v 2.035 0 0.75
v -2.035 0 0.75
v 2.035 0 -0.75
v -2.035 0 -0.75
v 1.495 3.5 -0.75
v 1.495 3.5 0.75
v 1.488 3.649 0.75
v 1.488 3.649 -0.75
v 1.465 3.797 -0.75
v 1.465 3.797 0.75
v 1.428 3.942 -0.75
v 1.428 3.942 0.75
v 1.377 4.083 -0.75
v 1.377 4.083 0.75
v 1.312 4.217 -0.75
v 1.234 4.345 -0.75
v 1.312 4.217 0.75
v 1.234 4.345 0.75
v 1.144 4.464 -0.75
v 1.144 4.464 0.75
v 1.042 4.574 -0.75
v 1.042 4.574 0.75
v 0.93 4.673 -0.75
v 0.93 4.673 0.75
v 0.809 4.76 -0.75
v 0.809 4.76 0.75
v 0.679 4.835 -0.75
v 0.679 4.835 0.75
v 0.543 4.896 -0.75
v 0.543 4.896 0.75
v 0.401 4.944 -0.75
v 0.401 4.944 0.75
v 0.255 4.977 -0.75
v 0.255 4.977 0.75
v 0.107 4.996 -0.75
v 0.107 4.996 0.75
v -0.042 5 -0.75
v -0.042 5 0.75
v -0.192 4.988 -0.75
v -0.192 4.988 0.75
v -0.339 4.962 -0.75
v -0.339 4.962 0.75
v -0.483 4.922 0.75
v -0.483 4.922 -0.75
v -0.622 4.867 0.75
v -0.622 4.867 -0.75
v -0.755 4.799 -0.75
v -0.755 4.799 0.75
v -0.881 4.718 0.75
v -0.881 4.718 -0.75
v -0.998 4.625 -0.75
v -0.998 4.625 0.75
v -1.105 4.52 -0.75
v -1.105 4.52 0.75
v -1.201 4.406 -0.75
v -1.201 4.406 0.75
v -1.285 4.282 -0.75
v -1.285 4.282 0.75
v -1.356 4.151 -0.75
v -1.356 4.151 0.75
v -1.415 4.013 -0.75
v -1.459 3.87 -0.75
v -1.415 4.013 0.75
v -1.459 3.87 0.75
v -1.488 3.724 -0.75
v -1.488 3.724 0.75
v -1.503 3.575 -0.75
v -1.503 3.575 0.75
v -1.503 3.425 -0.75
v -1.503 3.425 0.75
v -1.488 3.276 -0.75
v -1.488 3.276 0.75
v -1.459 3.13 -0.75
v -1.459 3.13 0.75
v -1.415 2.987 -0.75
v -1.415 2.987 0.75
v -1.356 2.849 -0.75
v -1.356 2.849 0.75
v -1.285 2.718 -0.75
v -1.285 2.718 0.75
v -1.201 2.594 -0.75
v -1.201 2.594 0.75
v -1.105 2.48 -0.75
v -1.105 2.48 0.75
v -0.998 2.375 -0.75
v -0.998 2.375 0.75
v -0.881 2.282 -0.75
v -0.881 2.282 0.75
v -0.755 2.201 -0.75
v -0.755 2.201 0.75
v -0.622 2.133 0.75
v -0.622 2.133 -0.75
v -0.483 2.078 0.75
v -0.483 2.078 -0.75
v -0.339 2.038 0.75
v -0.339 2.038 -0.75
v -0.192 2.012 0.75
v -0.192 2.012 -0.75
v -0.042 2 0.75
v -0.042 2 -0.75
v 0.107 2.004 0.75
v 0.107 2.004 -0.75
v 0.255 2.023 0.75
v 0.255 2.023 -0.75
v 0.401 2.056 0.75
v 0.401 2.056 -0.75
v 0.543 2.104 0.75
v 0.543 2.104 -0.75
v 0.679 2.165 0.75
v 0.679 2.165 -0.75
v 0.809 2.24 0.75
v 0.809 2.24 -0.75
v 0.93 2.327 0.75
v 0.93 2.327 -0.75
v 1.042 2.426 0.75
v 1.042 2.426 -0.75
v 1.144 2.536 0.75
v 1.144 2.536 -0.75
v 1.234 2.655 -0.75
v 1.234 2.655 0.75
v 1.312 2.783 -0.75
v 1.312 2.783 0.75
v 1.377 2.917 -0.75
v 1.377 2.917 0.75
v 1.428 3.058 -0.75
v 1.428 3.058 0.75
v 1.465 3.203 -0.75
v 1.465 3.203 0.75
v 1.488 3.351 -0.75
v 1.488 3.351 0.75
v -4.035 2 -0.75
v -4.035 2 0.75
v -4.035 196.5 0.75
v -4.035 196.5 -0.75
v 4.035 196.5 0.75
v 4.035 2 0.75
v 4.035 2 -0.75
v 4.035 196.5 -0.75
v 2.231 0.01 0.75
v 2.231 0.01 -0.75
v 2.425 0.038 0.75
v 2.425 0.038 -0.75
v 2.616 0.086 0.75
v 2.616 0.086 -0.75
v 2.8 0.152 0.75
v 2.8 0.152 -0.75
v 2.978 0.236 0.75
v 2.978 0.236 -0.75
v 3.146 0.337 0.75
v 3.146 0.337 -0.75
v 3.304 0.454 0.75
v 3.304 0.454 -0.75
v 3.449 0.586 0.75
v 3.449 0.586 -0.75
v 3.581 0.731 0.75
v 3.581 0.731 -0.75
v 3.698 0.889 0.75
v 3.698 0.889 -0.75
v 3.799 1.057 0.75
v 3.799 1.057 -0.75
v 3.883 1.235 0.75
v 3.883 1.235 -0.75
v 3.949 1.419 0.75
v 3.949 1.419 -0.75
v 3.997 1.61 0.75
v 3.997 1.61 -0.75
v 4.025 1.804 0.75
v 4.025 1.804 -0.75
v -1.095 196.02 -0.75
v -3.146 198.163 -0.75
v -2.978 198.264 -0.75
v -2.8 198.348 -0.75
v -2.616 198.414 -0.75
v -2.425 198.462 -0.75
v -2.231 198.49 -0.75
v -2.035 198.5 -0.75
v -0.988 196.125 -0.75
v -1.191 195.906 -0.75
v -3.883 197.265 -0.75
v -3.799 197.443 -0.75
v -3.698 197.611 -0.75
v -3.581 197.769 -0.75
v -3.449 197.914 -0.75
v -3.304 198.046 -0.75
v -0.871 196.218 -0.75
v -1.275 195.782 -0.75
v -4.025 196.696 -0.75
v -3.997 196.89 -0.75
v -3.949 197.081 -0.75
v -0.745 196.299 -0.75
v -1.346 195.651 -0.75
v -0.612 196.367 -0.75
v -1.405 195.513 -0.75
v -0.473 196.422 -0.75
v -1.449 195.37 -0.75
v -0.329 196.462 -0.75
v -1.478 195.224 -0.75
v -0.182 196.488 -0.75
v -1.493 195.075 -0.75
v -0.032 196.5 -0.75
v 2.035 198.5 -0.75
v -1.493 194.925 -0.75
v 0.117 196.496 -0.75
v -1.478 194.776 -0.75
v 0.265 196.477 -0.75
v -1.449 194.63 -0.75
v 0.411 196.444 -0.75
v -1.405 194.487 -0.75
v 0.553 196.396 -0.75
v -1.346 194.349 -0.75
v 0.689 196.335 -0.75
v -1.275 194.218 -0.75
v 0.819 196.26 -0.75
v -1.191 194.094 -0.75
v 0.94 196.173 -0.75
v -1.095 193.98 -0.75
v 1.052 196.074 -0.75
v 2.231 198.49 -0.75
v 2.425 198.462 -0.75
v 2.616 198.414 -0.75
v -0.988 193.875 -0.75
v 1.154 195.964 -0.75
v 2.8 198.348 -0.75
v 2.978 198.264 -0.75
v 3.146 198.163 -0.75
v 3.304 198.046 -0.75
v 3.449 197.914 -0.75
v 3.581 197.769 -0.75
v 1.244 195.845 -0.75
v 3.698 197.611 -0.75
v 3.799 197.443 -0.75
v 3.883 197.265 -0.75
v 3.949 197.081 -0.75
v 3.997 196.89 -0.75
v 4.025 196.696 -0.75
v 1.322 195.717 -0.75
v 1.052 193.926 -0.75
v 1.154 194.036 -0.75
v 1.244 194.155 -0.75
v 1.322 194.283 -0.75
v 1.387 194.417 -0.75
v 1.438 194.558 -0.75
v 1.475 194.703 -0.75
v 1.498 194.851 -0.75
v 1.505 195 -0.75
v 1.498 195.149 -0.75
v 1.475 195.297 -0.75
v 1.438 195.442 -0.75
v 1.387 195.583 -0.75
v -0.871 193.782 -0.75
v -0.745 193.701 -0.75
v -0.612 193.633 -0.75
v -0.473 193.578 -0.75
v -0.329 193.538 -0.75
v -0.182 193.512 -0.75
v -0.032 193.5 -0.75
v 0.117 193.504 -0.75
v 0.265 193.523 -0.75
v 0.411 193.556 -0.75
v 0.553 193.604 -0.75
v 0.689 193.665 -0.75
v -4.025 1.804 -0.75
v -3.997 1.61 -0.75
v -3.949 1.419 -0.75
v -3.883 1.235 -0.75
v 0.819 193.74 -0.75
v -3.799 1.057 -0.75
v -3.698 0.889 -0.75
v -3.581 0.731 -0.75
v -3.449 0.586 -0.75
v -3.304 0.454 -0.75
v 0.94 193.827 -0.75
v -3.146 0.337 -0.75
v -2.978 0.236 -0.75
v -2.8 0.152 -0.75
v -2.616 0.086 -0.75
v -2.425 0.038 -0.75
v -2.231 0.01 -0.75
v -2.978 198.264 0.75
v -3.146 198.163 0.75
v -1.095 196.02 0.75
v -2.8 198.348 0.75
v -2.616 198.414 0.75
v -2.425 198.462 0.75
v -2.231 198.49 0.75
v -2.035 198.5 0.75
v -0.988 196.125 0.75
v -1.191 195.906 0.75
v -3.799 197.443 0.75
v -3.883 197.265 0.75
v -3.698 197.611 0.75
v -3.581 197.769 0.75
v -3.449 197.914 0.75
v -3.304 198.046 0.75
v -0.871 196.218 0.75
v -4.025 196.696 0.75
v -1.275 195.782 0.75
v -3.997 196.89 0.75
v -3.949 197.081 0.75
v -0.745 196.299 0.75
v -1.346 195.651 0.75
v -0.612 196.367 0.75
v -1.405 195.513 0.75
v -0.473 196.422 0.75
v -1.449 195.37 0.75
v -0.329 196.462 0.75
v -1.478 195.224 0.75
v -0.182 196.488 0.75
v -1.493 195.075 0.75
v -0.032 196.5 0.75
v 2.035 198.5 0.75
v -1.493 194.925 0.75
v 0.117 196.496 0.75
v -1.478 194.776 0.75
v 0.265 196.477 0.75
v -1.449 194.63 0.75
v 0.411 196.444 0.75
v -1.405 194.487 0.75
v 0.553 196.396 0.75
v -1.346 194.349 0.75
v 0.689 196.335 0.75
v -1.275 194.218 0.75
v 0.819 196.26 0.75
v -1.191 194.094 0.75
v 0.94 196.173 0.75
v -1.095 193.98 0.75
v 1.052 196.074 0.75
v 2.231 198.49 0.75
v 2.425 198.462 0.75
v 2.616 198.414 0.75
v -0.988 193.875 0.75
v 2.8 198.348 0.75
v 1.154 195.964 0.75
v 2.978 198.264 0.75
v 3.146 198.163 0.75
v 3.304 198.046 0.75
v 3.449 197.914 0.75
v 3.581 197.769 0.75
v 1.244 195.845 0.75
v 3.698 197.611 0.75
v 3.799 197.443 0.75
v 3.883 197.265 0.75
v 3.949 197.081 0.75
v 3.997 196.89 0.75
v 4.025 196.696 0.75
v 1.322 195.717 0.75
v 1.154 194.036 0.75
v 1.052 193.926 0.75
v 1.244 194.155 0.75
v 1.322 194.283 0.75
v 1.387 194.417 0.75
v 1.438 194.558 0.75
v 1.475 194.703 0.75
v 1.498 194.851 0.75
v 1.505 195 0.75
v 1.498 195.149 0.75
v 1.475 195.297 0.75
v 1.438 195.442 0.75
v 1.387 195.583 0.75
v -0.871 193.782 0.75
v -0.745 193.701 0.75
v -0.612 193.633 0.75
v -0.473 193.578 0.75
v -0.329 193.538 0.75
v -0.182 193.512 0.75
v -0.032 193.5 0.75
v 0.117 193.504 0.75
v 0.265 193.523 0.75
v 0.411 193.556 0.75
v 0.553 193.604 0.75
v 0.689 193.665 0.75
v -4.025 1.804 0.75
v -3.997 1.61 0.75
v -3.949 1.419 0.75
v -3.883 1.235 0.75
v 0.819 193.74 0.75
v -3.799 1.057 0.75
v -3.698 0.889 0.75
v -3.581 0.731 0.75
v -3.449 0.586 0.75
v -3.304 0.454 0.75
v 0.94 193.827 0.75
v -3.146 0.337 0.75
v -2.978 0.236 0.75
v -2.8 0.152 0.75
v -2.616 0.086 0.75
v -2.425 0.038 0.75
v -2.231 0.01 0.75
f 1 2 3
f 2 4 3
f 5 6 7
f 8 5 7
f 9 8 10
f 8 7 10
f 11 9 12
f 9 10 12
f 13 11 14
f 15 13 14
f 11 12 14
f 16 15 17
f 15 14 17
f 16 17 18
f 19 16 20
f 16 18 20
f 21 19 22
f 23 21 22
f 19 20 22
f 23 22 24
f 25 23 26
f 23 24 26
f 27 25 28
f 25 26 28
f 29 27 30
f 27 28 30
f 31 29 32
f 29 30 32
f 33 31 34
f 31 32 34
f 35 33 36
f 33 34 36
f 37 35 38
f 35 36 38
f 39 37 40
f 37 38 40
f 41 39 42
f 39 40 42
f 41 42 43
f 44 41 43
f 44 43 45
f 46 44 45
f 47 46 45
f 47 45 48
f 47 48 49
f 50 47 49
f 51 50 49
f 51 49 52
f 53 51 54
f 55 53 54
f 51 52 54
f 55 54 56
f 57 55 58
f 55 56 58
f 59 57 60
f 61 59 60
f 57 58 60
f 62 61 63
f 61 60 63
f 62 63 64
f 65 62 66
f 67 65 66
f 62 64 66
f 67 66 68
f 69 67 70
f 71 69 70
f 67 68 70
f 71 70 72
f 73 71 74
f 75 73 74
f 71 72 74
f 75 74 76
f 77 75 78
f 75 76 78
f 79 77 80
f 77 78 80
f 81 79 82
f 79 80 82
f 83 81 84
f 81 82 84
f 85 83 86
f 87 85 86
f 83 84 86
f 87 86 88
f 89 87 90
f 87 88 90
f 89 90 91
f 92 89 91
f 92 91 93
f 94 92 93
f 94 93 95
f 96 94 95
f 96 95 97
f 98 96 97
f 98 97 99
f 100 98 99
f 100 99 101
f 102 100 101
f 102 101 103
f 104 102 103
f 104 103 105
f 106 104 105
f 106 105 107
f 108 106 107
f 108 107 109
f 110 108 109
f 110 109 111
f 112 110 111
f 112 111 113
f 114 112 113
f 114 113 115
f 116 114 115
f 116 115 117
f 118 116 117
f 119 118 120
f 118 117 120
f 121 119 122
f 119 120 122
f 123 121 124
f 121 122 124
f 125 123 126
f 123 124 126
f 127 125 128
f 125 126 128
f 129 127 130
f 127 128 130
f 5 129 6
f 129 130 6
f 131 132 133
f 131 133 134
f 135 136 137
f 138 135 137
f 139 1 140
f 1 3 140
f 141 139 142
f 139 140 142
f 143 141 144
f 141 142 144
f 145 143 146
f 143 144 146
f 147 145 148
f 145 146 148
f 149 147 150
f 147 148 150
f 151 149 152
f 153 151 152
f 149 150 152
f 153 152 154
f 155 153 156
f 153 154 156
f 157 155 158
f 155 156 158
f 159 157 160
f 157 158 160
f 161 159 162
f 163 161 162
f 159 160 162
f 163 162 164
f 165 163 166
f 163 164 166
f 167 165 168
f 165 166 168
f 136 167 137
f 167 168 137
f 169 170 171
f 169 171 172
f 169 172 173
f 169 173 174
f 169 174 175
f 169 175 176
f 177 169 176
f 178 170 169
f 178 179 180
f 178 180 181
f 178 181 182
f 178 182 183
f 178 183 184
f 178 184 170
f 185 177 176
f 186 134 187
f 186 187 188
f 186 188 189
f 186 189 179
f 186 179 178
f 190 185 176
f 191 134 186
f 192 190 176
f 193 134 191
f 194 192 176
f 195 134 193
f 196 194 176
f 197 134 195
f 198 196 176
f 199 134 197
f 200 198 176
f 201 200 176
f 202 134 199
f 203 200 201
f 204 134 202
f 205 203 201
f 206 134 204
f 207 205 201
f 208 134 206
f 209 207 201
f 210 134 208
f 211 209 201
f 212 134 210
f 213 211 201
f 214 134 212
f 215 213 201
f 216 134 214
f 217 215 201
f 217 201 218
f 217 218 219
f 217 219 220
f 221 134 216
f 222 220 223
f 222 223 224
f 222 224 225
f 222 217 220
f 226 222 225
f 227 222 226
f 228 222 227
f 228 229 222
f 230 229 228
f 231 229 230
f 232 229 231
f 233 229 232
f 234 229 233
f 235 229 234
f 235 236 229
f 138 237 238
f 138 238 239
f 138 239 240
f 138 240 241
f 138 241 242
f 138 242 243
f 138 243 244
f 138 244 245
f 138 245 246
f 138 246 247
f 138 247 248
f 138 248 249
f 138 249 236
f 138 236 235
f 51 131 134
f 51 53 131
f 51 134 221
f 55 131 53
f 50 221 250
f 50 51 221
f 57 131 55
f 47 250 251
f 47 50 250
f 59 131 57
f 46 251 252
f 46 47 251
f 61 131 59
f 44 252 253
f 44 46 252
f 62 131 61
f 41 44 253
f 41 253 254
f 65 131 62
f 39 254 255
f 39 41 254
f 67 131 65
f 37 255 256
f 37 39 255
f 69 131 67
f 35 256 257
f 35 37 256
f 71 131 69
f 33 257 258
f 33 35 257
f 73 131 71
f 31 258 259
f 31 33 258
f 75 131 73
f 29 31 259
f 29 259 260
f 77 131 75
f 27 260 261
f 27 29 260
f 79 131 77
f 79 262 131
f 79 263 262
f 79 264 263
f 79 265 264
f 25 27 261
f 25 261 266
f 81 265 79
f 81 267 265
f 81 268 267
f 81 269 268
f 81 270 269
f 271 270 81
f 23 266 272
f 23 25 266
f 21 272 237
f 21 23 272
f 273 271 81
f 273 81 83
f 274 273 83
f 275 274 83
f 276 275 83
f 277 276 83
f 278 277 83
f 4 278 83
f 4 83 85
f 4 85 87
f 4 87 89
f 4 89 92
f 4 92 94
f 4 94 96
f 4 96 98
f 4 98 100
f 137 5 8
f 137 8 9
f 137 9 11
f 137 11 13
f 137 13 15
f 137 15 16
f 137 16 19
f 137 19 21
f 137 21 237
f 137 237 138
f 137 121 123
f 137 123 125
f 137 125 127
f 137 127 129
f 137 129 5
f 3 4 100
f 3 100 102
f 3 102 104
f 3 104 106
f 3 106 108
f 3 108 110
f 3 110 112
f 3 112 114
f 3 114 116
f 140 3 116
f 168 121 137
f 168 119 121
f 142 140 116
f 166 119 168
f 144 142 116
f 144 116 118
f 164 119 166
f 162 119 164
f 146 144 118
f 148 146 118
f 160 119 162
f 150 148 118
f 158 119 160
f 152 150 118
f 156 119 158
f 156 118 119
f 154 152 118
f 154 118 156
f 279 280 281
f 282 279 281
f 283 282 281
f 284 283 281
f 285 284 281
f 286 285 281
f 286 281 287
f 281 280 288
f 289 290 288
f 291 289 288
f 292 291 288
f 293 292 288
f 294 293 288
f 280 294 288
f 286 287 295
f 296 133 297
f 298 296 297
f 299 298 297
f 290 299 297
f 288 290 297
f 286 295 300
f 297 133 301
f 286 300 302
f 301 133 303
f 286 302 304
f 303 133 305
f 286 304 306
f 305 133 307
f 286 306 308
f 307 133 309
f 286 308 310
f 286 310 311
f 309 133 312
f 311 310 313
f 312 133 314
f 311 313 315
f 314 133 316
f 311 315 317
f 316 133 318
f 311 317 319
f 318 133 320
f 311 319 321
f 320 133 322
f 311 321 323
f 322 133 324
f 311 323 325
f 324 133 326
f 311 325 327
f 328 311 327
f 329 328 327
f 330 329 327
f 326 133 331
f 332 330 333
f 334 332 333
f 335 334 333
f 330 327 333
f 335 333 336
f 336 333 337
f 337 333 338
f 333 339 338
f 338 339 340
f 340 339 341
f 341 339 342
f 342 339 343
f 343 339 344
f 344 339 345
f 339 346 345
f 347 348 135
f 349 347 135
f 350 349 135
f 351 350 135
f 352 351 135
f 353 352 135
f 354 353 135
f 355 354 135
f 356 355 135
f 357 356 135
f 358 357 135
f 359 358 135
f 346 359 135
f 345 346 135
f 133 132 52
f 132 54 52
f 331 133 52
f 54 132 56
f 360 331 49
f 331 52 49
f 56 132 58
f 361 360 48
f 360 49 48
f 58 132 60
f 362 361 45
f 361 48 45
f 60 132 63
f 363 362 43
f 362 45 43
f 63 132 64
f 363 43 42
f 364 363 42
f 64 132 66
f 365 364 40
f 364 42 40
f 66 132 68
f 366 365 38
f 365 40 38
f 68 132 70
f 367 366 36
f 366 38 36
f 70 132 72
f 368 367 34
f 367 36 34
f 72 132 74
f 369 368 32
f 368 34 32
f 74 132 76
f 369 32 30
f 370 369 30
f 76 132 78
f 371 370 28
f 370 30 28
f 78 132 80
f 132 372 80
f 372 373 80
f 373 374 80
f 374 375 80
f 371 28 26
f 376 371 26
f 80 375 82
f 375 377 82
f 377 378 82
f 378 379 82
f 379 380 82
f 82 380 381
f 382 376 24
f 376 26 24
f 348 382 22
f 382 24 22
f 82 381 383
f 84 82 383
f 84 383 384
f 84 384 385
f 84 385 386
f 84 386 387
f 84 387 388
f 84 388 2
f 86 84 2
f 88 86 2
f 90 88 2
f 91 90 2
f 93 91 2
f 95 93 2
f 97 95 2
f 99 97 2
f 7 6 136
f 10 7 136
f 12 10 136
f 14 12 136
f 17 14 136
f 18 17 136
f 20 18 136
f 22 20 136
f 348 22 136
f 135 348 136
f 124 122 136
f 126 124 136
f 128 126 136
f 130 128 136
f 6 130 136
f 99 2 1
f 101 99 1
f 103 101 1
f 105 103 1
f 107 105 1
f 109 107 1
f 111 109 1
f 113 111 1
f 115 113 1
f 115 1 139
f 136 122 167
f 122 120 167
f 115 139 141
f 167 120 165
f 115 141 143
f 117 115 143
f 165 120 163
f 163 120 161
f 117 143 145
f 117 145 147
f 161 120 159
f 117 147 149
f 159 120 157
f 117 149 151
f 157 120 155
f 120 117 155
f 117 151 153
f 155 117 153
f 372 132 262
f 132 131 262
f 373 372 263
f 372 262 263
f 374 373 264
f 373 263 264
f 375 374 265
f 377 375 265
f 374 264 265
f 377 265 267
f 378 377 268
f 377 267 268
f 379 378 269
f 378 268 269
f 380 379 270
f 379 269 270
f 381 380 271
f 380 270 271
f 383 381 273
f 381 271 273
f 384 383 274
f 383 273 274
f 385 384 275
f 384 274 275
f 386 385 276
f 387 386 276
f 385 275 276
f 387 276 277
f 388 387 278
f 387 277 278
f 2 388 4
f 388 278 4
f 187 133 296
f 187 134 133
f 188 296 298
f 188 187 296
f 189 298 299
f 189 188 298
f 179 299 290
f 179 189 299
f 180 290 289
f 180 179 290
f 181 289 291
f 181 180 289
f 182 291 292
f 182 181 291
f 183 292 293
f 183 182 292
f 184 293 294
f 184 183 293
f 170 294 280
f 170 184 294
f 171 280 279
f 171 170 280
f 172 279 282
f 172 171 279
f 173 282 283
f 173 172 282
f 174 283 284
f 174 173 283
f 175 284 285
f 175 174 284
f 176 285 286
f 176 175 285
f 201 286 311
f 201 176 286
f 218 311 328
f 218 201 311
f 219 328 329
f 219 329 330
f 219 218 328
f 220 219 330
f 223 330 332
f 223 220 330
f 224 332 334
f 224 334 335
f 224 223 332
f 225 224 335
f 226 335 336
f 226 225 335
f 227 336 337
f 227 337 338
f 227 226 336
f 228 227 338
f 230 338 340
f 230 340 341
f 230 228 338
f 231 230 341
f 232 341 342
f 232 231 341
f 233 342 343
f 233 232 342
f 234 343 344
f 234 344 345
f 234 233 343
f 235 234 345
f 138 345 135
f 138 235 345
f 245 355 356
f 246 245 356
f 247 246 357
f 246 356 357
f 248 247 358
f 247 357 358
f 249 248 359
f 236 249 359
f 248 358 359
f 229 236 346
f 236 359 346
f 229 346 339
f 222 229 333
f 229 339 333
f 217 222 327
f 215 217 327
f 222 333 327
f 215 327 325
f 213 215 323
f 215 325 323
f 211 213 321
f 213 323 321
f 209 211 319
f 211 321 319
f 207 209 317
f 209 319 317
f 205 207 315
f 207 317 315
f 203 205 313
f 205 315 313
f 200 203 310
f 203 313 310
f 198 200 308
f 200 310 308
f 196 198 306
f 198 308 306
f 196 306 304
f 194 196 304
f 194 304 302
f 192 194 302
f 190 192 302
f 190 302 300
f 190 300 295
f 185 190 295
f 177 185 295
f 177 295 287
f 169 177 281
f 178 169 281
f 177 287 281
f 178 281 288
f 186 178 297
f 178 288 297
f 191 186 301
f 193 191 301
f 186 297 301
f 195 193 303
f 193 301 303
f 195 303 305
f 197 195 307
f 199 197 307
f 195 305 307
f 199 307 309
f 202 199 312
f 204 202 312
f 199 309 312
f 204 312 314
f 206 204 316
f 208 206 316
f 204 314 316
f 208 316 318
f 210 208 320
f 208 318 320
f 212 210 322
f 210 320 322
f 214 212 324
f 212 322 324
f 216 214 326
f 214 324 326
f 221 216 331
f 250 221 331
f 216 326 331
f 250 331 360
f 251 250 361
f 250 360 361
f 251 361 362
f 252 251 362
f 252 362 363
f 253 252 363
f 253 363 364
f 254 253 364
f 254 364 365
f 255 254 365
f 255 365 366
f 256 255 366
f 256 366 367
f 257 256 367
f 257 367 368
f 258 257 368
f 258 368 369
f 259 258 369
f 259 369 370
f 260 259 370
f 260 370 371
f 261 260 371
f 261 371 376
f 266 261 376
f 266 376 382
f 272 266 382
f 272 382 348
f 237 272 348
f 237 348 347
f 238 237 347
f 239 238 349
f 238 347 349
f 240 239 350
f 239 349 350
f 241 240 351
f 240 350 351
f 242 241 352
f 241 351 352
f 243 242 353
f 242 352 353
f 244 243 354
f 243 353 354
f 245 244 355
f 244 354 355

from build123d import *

# Parameters (mm, degrees)
SKETCH1_W           = 8.07
SKETCH1_H           = 1.5
BOSS_EXTRUDE1_DEPTH = 198.5
SKETCH2_R           = 1.5
CUT_EXTRUDE1_DEPTH  = 1.5
FILLET1_R           = 2


with BuildPart() as part:
    # Sketch1 → Boss-Extrude1 (new body)
    with BuildSketch(Plane(origin=(0, 0, 0), x_dir=(1, 0, 0), z_dir=(0, 1, 0))):
        Rectangle(SKETCH1_W, SKETCH1_H)
    extrude(amount=BOSS_EXTRUDE1_DEPTH)

    # Sketch2 → Cut-Extrude1 (cut)
    with BuildSketch(Plane.XY.offset(0.75)):
        with Locations((-0.005, 3.499996429)):
            Circle(SKETCH2_R)
        with Locations((0.005, 195)):
            Circle(SKETCH2_R)
    extrude(amount=-CUT_EXTRUDE1_DEPTH, mode=Mode.SUBTRACT)

    # Fillet1
    fillet1_edges = [part.edges().sort_by_distance(p)[0] for p in [
        (-4.035, 198.5, 0),
        (4.035, 198.5, 0),
        (-4.035, 0, 0),
        (4.035, 0, 0),
    ]]
    fillet(fillet1_edges, radius=FILLET1_R)


solid = part.part
